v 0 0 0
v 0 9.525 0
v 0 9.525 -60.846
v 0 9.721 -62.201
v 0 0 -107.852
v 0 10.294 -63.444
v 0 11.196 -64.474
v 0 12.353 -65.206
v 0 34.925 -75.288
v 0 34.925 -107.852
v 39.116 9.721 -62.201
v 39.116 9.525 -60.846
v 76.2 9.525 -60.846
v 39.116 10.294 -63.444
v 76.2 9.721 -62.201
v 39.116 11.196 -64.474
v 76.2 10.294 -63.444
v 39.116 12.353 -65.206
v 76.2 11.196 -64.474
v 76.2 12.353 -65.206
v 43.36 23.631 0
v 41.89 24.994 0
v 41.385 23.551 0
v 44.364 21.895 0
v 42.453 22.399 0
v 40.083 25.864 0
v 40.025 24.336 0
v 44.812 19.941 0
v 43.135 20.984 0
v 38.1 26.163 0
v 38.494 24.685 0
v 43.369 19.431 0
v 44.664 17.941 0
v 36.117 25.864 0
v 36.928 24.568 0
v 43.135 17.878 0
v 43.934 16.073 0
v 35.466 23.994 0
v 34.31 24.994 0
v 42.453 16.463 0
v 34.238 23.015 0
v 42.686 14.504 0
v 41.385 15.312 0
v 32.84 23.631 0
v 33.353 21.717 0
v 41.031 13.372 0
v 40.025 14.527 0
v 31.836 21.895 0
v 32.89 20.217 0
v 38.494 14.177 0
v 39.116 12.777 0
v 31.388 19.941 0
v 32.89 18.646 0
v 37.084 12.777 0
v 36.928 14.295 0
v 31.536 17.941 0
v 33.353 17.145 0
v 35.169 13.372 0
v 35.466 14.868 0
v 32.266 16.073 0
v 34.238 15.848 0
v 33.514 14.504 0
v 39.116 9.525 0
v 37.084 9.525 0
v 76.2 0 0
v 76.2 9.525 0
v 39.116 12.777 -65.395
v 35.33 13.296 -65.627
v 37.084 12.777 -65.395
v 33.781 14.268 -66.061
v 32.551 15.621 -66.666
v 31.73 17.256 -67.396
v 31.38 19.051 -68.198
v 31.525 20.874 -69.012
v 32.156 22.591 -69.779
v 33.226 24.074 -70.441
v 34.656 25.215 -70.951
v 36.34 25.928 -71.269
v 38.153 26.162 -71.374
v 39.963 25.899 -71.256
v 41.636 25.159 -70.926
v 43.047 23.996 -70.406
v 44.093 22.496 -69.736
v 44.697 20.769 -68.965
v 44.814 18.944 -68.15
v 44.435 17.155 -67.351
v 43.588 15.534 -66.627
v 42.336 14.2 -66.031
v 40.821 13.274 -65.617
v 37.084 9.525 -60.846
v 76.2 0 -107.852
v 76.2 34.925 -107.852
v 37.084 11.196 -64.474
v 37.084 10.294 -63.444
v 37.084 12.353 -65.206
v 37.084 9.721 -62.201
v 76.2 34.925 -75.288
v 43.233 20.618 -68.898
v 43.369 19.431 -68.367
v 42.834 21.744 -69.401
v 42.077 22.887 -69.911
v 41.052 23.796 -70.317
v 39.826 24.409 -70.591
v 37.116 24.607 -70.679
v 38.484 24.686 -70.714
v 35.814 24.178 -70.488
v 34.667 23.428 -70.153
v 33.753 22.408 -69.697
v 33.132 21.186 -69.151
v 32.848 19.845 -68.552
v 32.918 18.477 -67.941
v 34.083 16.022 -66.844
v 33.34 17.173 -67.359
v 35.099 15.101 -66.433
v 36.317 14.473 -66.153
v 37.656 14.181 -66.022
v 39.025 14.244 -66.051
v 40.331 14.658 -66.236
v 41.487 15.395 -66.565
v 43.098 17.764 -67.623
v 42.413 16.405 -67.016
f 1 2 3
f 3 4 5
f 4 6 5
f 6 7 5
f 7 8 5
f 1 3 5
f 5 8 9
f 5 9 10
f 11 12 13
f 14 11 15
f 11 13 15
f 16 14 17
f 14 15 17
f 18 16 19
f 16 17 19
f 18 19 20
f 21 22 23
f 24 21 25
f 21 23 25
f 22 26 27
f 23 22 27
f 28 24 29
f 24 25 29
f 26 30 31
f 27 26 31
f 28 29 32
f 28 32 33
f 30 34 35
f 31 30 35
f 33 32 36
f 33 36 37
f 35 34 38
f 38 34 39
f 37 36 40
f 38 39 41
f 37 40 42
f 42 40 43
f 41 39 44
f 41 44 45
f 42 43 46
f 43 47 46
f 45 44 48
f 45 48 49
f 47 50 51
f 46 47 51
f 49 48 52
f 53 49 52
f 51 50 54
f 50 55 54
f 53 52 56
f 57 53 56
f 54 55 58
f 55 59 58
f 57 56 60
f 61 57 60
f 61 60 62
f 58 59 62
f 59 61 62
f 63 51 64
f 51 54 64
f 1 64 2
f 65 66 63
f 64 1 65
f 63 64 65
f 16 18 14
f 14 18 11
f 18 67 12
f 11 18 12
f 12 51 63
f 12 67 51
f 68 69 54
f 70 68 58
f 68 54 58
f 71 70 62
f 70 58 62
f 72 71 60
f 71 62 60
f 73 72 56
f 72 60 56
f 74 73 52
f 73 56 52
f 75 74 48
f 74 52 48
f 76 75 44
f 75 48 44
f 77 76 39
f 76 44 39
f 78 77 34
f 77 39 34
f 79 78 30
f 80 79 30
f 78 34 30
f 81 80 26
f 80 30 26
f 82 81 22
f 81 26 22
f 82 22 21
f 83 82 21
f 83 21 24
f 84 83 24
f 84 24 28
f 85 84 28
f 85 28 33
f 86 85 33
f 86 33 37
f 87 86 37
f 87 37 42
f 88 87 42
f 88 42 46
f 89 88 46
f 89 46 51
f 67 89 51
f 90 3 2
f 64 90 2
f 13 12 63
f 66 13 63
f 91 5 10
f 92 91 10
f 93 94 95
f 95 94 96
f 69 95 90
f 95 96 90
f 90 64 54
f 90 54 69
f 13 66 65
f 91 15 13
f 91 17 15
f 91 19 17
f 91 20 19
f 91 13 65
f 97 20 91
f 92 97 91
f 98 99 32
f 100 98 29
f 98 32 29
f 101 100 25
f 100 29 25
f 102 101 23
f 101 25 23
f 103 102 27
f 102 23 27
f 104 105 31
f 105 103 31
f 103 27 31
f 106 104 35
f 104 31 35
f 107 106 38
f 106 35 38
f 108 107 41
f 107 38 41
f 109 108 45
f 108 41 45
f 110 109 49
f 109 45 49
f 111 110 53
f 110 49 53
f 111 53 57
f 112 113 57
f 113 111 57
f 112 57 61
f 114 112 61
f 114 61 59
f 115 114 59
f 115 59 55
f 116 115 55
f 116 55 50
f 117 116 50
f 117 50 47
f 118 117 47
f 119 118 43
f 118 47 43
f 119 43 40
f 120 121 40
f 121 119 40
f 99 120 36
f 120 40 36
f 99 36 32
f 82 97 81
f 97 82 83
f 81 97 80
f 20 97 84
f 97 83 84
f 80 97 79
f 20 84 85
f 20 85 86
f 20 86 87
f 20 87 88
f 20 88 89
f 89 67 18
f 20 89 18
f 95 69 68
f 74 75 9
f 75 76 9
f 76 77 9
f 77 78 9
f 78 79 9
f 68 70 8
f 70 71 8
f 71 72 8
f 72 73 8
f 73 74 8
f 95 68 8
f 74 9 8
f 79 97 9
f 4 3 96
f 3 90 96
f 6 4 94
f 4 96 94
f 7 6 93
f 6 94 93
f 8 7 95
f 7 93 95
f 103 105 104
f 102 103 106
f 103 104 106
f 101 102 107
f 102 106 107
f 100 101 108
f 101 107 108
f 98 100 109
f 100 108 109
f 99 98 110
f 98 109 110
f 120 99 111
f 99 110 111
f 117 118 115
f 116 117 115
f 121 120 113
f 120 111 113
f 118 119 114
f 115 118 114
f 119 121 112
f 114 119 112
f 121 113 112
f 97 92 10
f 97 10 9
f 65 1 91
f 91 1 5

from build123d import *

# Parameters (mm, degrees)
EXTRUDE7_DEPTH = 76.2
EXTRUDE8_REACH = 138.595
SKETCH17_R     = 5.268795673
FILLET1_R      = 4.7752


with BuildPart() as part:
    # Sketch16 → Extrude7 (new body)
    with BuildSketch(Plane(origin=(0, 0, 0), x_dir=(0, 0, -1), z_dir=(1, 0, 0))):
        Polygon((0, 0), (107.851907976, 0), (107.851907976, 34.925), (75.287725604, 34.925), (63.942784648, 9.525), (0, 9.525), align=None)
    extrude(amount=EXTRUDE7_DEPTH)

    # Extrude8: up to this plane
    extrude8_end = Plane(origin=(76.2, 34.925, -75.287725604), z_dir=(0, -0.4078203414676676, -0.9130621934376623))
    # Sketch17 → Extrude8 (add, up to the surface)
    with BuildSketch(Plane.XY, mode=Mode.PRIVATE) as extrude8_sk1:
        with BuildLine():
            Line((39.116, 9.525), (37.084, 9.525))
            Line((37.084, 9.525), (37.084, 12.7))
            Line((37.084, 12.7), (37.084, 12.777118098))
            ThreePointArc((37.084, 12.777118098), (38.1, 26.162510517), (39.116, 12.777118098))
            Line((39.116, 12.777118098), (39.116, 12.7))
            Line((39.116, 12.7), (39.116, 9.525))
        make_face()
        with Locations((38.1, 19.431255259)):
            Circle(SKETCH17_R, mode=Mode.SUBTRACT)
    extrude8_tool1 = split(extrude(extrude8_sk1.sketch, amount=-EXTRUDE8_REACH, mode=Mode.PRIVATE), bisect_by=extrude8_end, keep=Keep.BOTH, mode=Mode.PRIVATE)
    add(extrude8_tool1.solids().sort_by_distance((38.1, 9.73902, 0))[0])

    # Fillet1
    fillet1_edges = [part.edges().sort_by_distance(p)[0] for p in [
        (57.658, 9.525, -63.942784648),
        (18.542, 9.525, -63.942784648),
    ]]
    fillet(fillet1_edges, radius=FILLET1_R)


solid = part.part
